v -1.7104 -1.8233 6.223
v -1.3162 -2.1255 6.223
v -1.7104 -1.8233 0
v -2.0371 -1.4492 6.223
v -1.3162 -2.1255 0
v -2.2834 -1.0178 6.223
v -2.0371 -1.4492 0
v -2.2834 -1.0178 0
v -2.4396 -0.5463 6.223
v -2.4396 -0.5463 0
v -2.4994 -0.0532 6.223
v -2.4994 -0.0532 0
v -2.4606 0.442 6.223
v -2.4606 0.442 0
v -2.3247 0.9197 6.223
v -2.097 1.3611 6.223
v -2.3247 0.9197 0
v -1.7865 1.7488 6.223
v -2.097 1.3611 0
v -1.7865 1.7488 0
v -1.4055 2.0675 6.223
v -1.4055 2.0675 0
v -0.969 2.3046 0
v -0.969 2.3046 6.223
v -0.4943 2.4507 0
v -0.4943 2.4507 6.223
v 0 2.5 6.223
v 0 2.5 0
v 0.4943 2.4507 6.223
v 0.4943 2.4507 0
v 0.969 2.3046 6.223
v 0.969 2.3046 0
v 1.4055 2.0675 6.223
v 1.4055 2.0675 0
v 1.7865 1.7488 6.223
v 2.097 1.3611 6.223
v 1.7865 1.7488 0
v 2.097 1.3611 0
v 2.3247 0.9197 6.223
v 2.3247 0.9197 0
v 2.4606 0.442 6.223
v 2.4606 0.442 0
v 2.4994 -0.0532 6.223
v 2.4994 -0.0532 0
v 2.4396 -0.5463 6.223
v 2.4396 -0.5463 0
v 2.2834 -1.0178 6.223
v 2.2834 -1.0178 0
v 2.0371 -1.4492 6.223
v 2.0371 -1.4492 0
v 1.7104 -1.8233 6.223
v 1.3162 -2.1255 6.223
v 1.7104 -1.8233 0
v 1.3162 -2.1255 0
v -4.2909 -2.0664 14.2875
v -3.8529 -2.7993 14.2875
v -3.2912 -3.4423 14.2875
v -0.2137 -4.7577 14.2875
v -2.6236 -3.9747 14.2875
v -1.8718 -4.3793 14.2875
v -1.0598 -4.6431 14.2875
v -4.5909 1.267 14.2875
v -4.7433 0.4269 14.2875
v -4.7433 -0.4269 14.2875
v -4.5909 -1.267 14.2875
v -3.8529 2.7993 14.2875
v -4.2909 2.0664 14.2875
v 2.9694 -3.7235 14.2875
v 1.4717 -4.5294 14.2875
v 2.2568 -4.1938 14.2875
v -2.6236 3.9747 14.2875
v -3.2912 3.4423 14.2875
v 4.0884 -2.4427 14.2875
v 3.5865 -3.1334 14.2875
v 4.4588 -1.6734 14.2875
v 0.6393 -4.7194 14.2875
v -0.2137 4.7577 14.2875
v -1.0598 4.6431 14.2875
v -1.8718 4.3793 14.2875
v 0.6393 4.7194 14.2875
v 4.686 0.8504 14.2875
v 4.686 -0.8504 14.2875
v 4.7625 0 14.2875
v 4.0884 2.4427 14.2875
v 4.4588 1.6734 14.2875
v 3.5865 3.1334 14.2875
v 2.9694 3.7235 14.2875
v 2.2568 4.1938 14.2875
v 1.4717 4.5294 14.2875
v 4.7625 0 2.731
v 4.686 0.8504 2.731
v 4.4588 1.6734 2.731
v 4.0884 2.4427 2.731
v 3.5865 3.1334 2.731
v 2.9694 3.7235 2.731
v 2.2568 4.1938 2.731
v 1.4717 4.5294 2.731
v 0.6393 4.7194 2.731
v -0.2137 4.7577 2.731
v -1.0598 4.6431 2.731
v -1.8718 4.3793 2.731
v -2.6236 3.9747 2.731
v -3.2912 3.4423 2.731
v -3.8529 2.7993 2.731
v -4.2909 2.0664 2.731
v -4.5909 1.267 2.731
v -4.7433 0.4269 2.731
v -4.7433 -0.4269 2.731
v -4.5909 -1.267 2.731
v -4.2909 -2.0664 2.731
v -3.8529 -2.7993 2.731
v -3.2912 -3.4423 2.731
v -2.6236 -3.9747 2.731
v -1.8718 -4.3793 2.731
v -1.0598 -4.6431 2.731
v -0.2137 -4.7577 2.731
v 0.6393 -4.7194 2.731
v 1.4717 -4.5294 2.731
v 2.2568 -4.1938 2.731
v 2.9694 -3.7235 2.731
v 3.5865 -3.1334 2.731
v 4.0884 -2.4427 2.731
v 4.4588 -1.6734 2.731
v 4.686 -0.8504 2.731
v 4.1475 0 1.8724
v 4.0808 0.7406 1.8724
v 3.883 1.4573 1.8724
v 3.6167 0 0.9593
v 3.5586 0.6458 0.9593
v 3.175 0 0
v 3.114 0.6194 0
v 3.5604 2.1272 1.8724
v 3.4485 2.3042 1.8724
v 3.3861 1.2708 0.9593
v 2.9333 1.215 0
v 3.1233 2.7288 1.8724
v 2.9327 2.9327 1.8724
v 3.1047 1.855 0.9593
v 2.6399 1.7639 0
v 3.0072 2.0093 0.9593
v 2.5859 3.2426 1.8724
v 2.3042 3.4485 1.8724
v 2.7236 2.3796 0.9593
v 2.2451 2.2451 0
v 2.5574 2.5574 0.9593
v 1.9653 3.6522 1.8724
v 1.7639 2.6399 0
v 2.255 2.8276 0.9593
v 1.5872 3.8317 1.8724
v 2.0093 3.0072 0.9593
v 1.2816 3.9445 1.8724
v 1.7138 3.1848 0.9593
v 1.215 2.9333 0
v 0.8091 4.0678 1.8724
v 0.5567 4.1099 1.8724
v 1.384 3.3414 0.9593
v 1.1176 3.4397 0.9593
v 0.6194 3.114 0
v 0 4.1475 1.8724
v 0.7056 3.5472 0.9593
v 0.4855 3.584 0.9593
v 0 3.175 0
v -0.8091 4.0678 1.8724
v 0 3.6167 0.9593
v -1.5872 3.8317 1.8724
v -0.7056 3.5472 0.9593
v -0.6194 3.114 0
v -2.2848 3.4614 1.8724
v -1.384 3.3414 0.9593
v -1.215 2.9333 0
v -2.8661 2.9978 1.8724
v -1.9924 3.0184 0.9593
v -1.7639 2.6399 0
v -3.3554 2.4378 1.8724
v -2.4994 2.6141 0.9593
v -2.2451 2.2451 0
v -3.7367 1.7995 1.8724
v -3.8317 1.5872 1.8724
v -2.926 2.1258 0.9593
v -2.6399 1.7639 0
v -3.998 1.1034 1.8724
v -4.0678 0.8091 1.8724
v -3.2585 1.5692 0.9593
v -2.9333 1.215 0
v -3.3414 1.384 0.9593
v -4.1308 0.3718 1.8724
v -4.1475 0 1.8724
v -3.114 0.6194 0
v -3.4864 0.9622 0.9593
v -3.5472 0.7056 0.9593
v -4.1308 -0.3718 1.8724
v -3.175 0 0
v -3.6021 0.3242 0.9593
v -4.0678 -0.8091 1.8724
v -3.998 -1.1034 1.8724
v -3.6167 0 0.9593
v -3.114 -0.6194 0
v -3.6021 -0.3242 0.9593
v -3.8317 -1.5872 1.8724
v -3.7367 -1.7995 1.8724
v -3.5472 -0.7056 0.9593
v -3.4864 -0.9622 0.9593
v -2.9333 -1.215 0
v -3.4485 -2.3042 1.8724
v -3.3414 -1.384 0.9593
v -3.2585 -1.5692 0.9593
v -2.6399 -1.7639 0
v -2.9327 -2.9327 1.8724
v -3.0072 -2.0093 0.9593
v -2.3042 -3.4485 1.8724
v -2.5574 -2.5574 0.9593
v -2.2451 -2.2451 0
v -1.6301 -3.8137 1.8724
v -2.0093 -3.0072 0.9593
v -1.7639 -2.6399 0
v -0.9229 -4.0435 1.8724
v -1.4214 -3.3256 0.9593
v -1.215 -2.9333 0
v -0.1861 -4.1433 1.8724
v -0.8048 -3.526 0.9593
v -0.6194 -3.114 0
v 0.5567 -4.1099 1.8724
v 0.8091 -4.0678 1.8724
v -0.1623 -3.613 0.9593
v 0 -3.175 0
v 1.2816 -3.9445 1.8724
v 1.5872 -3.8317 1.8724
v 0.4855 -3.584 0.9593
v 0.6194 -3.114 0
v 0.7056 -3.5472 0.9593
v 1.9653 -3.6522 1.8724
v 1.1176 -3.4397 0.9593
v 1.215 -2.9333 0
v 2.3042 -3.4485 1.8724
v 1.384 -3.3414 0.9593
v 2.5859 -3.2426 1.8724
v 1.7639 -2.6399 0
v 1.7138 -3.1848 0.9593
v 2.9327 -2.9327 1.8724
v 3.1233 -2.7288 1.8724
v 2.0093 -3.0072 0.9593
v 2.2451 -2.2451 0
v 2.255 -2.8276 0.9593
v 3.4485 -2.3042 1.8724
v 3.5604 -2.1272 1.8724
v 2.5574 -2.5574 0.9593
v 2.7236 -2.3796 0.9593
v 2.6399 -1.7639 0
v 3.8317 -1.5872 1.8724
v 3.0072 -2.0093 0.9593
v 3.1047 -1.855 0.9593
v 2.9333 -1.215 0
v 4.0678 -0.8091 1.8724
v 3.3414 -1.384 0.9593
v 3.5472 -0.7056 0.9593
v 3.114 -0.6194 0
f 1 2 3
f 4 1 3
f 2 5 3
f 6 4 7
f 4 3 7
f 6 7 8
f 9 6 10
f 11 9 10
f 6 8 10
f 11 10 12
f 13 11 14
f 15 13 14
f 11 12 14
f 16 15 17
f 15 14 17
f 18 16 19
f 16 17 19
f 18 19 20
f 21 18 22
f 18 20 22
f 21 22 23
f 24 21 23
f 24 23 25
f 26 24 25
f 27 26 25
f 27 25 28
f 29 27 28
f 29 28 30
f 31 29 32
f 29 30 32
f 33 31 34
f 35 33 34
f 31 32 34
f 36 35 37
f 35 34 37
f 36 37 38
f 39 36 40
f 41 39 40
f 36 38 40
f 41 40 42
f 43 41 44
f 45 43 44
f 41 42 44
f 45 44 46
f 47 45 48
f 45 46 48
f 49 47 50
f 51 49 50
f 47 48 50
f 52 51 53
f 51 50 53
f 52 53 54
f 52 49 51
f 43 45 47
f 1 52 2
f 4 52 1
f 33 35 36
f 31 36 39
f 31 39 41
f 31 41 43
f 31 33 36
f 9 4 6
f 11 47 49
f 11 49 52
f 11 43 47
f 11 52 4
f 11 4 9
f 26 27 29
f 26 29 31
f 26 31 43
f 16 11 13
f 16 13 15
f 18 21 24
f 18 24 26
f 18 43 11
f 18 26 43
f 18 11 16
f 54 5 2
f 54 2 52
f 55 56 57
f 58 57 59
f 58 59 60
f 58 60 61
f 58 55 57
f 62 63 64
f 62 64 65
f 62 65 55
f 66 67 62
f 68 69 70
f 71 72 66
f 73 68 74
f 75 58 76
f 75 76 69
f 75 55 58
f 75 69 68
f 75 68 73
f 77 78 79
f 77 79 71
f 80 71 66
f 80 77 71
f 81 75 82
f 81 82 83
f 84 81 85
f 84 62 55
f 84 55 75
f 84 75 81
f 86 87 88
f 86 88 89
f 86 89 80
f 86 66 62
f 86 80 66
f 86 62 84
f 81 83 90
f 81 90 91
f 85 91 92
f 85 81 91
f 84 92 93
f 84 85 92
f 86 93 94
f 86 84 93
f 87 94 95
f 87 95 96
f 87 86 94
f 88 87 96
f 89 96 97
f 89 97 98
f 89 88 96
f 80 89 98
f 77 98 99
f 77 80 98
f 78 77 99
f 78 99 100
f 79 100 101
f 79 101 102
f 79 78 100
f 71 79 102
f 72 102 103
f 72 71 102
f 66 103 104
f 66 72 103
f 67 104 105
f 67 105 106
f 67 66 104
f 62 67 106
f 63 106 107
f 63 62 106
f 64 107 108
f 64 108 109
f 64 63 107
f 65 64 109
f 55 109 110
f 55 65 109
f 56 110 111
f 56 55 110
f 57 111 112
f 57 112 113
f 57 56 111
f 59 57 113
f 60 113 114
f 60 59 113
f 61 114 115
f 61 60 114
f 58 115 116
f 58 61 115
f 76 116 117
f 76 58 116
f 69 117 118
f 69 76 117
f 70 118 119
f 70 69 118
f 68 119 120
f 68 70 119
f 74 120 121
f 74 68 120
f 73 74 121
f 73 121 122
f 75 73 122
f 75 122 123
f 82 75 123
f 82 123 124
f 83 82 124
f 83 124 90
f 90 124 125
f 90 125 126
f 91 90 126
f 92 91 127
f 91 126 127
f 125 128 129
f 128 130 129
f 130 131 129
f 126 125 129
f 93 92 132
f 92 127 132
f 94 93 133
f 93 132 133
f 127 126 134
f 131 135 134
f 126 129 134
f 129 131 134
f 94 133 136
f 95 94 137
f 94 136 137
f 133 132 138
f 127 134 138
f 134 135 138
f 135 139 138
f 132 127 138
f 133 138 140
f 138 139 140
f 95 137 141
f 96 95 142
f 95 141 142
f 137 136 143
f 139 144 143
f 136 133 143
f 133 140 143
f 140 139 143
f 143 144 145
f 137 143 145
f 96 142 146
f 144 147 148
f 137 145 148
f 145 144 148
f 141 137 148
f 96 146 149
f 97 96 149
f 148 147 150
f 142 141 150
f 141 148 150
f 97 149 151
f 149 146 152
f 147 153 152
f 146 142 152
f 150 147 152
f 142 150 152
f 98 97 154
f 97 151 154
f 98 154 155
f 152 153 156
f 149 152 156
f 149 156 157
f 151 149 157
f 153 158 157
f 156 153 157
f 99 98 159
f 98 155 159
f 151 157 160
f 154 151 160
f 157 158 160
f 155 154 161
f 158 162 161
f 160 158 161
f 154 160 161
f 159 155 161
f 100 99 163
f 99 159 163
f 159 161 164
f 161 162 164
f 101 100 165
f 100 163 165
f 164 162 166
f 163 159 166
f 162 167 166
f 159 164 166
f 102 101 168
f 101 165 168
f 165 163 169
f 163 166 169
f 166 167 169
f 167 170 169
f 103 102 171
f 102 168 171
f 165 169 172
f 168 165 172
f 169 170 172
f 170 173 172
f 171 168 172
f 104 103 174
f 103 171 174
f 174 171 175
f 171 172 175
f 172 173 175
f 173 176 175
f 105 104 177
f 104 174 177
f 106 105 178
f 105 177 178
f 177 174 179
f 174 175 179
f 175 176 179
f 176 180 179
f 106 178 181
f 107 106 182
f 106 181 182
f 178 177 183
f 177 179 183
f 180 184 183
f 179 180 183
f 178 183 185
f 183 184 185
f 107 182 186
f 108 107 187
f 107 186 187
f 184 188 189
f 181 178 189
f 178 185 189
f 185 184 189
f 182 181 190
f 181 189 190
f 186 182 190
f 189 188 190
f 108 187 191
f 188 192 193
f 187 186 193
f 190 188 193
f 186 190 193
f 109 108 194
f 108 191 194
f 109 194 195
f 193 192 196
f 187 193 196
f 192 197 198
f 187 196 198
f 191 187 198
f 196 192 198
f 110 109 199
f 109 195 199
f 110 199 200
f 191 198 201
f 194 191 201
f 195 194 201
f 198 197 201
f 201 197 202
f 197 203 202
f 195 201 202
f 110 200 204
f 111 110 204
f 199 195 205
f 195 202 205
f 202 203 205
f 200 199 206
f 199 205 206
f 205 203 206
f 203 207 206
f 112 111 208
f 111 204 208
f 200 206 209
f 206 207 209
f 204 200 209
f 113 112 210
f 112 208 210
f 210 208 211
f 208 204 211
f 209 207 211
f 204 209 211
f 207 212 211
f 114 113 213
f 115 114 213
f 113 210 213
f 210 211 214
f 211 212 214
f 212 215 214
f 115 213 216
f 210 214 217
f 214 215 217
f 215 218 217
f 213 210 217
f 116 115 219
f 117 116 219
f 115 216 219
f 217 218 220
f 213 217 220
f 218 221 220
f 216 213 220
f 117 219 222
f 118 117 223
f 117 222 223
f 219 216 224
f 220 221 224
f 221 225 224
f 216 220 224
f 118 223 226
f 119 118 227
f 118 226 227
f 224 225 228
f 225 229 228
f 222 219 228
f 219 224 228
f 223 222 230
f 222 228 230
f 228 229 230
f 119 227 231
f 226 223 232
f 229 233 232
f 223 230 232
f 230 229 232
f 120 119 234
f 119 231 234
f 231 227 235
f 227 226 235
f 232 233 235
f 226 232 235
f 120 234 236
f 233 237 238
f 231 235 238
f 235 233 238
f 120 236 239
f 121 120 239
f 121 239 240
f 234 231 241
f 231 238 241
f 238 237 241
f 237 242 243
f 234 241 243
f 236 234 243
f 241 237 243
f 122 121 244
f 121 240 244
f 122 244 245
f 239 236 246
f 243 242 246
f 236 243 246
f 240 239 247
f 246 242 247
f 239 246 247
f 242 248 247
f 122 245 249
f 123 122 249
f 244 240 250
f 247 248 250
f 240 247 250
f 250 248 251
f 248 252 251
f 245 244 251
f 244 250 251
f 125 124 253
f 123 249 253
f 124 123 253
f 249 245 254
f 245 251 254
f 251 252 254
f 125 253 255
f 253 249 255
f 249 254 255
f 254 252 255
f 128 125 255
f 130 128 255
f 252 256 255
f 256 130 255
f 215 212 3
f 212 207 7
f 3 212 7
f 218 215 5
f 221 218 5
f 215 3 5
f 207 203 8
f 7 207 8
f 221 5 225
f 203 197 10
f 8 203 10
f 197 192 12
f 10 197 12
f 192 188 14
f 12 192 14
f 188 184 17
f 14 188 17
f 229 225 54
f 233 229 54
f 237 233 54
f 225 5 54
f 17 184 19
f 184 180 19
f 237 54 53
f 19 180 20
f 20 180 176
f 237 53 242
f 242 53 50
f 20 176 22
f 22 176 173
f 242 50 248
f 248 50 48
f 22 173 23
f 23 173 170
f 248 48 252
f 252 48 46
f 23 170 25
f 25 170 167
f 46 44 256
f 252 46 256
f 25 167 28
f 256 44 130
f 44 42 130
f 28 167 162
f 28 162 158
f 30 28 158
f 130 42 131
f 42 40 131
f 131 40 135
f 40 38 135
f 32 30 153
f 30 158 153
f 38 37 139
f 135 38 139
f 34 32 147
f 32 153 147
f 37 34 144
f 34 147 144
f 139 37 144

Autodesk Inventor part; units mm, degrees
ref_plane "YZ Plane" through (0, 0, 0) normal (1, 0, 0) x (0, 1, 0)
ref_plane "XZ Plane" through (0, 0, 0) normal (0, 1, 0) x (-1, 0, 0)
ref_plane "XY Plane" through (0, 0, 0) normal (0, 0, 1) x (1, 0, 0)
sketch "Sketch1" plane through (0, 0, 0) normal (0, 0, 1) x (1, 0, 0)
  circle A0 centre (0, 0) radius 2.5
  line L0 (-1.3162, -2.1255) -> (1.3162, -2.1255)
  circle A1 centre (0, 0) radius 3.175
  dimension "d0" = 5
  dimension "d1" = 6.35
extrude "Extrusion1" add sketch "Sketch1" along normal blind 6.35 contours L0 A0 | A1 picked at (-0.2721, -2.2046)
sketch "Sketch2" plane through (0, 0, 6.35) normal (0, 0, 1) x (1, 0, 0)
  circle A0 centre (0, 0) radius 9.525
  circle A1 centre (0, 0) radius 10.8857
  dimension "d4" = 19.05
  dimension "d5" = 21.7714
extrude "Extrusion2" add sketch "Sketch2" along normal blind 6.35
sketch "Sketch4" plane through (0, 0, 12.7) normal (0, 0, 1) x (1, 0, 0)
  circle A0 centre (0, 0) radius 10.8857 projected
  circle A1 centre (0, 0) radius 9.525 projected
extrude "Extrusion4" add sketch "Sketch4" along normal blind 1.5875 contours A1
sketch "Sketch5" plane through (0, 0, 12.7) normal (0, 0, 1) x (1, 0, 0)
  circle A0 centre (0, 0) radius 10.8857 projected
  circle A1 centre (0, 0) radius 9.525 projected
extrude "Extrusion5" cut sketch "Sketch5" against normal blind 9.525
sketch "Sketch6" plane through (0, 0, 12.7) normal (0, 0, -1) x (-1, 0, 0)
  circle A0 centre (0, 0) radius 9.525 projected
extrude "Extrusion6" add sketch "Sketch6" along normal blind 6.477
fillet "Fillet2" radius 11.1125 1 edges at (-3.175, 0, 6.223)
sketch "Sketch7" plane through (0, 0, 14.2875) normal (0, 0, 1) x (1, 0, 0)
  circle A0 centre (0, 0) radius 9.525 projected
  circle A1 centre (0, 0) radius 4.7625
  dimension "d18" = 9.525
extrude "Extrusion7" cut sketch "Sketch7" against normal blind 15.748
properties part number "Shaft Adapter"
